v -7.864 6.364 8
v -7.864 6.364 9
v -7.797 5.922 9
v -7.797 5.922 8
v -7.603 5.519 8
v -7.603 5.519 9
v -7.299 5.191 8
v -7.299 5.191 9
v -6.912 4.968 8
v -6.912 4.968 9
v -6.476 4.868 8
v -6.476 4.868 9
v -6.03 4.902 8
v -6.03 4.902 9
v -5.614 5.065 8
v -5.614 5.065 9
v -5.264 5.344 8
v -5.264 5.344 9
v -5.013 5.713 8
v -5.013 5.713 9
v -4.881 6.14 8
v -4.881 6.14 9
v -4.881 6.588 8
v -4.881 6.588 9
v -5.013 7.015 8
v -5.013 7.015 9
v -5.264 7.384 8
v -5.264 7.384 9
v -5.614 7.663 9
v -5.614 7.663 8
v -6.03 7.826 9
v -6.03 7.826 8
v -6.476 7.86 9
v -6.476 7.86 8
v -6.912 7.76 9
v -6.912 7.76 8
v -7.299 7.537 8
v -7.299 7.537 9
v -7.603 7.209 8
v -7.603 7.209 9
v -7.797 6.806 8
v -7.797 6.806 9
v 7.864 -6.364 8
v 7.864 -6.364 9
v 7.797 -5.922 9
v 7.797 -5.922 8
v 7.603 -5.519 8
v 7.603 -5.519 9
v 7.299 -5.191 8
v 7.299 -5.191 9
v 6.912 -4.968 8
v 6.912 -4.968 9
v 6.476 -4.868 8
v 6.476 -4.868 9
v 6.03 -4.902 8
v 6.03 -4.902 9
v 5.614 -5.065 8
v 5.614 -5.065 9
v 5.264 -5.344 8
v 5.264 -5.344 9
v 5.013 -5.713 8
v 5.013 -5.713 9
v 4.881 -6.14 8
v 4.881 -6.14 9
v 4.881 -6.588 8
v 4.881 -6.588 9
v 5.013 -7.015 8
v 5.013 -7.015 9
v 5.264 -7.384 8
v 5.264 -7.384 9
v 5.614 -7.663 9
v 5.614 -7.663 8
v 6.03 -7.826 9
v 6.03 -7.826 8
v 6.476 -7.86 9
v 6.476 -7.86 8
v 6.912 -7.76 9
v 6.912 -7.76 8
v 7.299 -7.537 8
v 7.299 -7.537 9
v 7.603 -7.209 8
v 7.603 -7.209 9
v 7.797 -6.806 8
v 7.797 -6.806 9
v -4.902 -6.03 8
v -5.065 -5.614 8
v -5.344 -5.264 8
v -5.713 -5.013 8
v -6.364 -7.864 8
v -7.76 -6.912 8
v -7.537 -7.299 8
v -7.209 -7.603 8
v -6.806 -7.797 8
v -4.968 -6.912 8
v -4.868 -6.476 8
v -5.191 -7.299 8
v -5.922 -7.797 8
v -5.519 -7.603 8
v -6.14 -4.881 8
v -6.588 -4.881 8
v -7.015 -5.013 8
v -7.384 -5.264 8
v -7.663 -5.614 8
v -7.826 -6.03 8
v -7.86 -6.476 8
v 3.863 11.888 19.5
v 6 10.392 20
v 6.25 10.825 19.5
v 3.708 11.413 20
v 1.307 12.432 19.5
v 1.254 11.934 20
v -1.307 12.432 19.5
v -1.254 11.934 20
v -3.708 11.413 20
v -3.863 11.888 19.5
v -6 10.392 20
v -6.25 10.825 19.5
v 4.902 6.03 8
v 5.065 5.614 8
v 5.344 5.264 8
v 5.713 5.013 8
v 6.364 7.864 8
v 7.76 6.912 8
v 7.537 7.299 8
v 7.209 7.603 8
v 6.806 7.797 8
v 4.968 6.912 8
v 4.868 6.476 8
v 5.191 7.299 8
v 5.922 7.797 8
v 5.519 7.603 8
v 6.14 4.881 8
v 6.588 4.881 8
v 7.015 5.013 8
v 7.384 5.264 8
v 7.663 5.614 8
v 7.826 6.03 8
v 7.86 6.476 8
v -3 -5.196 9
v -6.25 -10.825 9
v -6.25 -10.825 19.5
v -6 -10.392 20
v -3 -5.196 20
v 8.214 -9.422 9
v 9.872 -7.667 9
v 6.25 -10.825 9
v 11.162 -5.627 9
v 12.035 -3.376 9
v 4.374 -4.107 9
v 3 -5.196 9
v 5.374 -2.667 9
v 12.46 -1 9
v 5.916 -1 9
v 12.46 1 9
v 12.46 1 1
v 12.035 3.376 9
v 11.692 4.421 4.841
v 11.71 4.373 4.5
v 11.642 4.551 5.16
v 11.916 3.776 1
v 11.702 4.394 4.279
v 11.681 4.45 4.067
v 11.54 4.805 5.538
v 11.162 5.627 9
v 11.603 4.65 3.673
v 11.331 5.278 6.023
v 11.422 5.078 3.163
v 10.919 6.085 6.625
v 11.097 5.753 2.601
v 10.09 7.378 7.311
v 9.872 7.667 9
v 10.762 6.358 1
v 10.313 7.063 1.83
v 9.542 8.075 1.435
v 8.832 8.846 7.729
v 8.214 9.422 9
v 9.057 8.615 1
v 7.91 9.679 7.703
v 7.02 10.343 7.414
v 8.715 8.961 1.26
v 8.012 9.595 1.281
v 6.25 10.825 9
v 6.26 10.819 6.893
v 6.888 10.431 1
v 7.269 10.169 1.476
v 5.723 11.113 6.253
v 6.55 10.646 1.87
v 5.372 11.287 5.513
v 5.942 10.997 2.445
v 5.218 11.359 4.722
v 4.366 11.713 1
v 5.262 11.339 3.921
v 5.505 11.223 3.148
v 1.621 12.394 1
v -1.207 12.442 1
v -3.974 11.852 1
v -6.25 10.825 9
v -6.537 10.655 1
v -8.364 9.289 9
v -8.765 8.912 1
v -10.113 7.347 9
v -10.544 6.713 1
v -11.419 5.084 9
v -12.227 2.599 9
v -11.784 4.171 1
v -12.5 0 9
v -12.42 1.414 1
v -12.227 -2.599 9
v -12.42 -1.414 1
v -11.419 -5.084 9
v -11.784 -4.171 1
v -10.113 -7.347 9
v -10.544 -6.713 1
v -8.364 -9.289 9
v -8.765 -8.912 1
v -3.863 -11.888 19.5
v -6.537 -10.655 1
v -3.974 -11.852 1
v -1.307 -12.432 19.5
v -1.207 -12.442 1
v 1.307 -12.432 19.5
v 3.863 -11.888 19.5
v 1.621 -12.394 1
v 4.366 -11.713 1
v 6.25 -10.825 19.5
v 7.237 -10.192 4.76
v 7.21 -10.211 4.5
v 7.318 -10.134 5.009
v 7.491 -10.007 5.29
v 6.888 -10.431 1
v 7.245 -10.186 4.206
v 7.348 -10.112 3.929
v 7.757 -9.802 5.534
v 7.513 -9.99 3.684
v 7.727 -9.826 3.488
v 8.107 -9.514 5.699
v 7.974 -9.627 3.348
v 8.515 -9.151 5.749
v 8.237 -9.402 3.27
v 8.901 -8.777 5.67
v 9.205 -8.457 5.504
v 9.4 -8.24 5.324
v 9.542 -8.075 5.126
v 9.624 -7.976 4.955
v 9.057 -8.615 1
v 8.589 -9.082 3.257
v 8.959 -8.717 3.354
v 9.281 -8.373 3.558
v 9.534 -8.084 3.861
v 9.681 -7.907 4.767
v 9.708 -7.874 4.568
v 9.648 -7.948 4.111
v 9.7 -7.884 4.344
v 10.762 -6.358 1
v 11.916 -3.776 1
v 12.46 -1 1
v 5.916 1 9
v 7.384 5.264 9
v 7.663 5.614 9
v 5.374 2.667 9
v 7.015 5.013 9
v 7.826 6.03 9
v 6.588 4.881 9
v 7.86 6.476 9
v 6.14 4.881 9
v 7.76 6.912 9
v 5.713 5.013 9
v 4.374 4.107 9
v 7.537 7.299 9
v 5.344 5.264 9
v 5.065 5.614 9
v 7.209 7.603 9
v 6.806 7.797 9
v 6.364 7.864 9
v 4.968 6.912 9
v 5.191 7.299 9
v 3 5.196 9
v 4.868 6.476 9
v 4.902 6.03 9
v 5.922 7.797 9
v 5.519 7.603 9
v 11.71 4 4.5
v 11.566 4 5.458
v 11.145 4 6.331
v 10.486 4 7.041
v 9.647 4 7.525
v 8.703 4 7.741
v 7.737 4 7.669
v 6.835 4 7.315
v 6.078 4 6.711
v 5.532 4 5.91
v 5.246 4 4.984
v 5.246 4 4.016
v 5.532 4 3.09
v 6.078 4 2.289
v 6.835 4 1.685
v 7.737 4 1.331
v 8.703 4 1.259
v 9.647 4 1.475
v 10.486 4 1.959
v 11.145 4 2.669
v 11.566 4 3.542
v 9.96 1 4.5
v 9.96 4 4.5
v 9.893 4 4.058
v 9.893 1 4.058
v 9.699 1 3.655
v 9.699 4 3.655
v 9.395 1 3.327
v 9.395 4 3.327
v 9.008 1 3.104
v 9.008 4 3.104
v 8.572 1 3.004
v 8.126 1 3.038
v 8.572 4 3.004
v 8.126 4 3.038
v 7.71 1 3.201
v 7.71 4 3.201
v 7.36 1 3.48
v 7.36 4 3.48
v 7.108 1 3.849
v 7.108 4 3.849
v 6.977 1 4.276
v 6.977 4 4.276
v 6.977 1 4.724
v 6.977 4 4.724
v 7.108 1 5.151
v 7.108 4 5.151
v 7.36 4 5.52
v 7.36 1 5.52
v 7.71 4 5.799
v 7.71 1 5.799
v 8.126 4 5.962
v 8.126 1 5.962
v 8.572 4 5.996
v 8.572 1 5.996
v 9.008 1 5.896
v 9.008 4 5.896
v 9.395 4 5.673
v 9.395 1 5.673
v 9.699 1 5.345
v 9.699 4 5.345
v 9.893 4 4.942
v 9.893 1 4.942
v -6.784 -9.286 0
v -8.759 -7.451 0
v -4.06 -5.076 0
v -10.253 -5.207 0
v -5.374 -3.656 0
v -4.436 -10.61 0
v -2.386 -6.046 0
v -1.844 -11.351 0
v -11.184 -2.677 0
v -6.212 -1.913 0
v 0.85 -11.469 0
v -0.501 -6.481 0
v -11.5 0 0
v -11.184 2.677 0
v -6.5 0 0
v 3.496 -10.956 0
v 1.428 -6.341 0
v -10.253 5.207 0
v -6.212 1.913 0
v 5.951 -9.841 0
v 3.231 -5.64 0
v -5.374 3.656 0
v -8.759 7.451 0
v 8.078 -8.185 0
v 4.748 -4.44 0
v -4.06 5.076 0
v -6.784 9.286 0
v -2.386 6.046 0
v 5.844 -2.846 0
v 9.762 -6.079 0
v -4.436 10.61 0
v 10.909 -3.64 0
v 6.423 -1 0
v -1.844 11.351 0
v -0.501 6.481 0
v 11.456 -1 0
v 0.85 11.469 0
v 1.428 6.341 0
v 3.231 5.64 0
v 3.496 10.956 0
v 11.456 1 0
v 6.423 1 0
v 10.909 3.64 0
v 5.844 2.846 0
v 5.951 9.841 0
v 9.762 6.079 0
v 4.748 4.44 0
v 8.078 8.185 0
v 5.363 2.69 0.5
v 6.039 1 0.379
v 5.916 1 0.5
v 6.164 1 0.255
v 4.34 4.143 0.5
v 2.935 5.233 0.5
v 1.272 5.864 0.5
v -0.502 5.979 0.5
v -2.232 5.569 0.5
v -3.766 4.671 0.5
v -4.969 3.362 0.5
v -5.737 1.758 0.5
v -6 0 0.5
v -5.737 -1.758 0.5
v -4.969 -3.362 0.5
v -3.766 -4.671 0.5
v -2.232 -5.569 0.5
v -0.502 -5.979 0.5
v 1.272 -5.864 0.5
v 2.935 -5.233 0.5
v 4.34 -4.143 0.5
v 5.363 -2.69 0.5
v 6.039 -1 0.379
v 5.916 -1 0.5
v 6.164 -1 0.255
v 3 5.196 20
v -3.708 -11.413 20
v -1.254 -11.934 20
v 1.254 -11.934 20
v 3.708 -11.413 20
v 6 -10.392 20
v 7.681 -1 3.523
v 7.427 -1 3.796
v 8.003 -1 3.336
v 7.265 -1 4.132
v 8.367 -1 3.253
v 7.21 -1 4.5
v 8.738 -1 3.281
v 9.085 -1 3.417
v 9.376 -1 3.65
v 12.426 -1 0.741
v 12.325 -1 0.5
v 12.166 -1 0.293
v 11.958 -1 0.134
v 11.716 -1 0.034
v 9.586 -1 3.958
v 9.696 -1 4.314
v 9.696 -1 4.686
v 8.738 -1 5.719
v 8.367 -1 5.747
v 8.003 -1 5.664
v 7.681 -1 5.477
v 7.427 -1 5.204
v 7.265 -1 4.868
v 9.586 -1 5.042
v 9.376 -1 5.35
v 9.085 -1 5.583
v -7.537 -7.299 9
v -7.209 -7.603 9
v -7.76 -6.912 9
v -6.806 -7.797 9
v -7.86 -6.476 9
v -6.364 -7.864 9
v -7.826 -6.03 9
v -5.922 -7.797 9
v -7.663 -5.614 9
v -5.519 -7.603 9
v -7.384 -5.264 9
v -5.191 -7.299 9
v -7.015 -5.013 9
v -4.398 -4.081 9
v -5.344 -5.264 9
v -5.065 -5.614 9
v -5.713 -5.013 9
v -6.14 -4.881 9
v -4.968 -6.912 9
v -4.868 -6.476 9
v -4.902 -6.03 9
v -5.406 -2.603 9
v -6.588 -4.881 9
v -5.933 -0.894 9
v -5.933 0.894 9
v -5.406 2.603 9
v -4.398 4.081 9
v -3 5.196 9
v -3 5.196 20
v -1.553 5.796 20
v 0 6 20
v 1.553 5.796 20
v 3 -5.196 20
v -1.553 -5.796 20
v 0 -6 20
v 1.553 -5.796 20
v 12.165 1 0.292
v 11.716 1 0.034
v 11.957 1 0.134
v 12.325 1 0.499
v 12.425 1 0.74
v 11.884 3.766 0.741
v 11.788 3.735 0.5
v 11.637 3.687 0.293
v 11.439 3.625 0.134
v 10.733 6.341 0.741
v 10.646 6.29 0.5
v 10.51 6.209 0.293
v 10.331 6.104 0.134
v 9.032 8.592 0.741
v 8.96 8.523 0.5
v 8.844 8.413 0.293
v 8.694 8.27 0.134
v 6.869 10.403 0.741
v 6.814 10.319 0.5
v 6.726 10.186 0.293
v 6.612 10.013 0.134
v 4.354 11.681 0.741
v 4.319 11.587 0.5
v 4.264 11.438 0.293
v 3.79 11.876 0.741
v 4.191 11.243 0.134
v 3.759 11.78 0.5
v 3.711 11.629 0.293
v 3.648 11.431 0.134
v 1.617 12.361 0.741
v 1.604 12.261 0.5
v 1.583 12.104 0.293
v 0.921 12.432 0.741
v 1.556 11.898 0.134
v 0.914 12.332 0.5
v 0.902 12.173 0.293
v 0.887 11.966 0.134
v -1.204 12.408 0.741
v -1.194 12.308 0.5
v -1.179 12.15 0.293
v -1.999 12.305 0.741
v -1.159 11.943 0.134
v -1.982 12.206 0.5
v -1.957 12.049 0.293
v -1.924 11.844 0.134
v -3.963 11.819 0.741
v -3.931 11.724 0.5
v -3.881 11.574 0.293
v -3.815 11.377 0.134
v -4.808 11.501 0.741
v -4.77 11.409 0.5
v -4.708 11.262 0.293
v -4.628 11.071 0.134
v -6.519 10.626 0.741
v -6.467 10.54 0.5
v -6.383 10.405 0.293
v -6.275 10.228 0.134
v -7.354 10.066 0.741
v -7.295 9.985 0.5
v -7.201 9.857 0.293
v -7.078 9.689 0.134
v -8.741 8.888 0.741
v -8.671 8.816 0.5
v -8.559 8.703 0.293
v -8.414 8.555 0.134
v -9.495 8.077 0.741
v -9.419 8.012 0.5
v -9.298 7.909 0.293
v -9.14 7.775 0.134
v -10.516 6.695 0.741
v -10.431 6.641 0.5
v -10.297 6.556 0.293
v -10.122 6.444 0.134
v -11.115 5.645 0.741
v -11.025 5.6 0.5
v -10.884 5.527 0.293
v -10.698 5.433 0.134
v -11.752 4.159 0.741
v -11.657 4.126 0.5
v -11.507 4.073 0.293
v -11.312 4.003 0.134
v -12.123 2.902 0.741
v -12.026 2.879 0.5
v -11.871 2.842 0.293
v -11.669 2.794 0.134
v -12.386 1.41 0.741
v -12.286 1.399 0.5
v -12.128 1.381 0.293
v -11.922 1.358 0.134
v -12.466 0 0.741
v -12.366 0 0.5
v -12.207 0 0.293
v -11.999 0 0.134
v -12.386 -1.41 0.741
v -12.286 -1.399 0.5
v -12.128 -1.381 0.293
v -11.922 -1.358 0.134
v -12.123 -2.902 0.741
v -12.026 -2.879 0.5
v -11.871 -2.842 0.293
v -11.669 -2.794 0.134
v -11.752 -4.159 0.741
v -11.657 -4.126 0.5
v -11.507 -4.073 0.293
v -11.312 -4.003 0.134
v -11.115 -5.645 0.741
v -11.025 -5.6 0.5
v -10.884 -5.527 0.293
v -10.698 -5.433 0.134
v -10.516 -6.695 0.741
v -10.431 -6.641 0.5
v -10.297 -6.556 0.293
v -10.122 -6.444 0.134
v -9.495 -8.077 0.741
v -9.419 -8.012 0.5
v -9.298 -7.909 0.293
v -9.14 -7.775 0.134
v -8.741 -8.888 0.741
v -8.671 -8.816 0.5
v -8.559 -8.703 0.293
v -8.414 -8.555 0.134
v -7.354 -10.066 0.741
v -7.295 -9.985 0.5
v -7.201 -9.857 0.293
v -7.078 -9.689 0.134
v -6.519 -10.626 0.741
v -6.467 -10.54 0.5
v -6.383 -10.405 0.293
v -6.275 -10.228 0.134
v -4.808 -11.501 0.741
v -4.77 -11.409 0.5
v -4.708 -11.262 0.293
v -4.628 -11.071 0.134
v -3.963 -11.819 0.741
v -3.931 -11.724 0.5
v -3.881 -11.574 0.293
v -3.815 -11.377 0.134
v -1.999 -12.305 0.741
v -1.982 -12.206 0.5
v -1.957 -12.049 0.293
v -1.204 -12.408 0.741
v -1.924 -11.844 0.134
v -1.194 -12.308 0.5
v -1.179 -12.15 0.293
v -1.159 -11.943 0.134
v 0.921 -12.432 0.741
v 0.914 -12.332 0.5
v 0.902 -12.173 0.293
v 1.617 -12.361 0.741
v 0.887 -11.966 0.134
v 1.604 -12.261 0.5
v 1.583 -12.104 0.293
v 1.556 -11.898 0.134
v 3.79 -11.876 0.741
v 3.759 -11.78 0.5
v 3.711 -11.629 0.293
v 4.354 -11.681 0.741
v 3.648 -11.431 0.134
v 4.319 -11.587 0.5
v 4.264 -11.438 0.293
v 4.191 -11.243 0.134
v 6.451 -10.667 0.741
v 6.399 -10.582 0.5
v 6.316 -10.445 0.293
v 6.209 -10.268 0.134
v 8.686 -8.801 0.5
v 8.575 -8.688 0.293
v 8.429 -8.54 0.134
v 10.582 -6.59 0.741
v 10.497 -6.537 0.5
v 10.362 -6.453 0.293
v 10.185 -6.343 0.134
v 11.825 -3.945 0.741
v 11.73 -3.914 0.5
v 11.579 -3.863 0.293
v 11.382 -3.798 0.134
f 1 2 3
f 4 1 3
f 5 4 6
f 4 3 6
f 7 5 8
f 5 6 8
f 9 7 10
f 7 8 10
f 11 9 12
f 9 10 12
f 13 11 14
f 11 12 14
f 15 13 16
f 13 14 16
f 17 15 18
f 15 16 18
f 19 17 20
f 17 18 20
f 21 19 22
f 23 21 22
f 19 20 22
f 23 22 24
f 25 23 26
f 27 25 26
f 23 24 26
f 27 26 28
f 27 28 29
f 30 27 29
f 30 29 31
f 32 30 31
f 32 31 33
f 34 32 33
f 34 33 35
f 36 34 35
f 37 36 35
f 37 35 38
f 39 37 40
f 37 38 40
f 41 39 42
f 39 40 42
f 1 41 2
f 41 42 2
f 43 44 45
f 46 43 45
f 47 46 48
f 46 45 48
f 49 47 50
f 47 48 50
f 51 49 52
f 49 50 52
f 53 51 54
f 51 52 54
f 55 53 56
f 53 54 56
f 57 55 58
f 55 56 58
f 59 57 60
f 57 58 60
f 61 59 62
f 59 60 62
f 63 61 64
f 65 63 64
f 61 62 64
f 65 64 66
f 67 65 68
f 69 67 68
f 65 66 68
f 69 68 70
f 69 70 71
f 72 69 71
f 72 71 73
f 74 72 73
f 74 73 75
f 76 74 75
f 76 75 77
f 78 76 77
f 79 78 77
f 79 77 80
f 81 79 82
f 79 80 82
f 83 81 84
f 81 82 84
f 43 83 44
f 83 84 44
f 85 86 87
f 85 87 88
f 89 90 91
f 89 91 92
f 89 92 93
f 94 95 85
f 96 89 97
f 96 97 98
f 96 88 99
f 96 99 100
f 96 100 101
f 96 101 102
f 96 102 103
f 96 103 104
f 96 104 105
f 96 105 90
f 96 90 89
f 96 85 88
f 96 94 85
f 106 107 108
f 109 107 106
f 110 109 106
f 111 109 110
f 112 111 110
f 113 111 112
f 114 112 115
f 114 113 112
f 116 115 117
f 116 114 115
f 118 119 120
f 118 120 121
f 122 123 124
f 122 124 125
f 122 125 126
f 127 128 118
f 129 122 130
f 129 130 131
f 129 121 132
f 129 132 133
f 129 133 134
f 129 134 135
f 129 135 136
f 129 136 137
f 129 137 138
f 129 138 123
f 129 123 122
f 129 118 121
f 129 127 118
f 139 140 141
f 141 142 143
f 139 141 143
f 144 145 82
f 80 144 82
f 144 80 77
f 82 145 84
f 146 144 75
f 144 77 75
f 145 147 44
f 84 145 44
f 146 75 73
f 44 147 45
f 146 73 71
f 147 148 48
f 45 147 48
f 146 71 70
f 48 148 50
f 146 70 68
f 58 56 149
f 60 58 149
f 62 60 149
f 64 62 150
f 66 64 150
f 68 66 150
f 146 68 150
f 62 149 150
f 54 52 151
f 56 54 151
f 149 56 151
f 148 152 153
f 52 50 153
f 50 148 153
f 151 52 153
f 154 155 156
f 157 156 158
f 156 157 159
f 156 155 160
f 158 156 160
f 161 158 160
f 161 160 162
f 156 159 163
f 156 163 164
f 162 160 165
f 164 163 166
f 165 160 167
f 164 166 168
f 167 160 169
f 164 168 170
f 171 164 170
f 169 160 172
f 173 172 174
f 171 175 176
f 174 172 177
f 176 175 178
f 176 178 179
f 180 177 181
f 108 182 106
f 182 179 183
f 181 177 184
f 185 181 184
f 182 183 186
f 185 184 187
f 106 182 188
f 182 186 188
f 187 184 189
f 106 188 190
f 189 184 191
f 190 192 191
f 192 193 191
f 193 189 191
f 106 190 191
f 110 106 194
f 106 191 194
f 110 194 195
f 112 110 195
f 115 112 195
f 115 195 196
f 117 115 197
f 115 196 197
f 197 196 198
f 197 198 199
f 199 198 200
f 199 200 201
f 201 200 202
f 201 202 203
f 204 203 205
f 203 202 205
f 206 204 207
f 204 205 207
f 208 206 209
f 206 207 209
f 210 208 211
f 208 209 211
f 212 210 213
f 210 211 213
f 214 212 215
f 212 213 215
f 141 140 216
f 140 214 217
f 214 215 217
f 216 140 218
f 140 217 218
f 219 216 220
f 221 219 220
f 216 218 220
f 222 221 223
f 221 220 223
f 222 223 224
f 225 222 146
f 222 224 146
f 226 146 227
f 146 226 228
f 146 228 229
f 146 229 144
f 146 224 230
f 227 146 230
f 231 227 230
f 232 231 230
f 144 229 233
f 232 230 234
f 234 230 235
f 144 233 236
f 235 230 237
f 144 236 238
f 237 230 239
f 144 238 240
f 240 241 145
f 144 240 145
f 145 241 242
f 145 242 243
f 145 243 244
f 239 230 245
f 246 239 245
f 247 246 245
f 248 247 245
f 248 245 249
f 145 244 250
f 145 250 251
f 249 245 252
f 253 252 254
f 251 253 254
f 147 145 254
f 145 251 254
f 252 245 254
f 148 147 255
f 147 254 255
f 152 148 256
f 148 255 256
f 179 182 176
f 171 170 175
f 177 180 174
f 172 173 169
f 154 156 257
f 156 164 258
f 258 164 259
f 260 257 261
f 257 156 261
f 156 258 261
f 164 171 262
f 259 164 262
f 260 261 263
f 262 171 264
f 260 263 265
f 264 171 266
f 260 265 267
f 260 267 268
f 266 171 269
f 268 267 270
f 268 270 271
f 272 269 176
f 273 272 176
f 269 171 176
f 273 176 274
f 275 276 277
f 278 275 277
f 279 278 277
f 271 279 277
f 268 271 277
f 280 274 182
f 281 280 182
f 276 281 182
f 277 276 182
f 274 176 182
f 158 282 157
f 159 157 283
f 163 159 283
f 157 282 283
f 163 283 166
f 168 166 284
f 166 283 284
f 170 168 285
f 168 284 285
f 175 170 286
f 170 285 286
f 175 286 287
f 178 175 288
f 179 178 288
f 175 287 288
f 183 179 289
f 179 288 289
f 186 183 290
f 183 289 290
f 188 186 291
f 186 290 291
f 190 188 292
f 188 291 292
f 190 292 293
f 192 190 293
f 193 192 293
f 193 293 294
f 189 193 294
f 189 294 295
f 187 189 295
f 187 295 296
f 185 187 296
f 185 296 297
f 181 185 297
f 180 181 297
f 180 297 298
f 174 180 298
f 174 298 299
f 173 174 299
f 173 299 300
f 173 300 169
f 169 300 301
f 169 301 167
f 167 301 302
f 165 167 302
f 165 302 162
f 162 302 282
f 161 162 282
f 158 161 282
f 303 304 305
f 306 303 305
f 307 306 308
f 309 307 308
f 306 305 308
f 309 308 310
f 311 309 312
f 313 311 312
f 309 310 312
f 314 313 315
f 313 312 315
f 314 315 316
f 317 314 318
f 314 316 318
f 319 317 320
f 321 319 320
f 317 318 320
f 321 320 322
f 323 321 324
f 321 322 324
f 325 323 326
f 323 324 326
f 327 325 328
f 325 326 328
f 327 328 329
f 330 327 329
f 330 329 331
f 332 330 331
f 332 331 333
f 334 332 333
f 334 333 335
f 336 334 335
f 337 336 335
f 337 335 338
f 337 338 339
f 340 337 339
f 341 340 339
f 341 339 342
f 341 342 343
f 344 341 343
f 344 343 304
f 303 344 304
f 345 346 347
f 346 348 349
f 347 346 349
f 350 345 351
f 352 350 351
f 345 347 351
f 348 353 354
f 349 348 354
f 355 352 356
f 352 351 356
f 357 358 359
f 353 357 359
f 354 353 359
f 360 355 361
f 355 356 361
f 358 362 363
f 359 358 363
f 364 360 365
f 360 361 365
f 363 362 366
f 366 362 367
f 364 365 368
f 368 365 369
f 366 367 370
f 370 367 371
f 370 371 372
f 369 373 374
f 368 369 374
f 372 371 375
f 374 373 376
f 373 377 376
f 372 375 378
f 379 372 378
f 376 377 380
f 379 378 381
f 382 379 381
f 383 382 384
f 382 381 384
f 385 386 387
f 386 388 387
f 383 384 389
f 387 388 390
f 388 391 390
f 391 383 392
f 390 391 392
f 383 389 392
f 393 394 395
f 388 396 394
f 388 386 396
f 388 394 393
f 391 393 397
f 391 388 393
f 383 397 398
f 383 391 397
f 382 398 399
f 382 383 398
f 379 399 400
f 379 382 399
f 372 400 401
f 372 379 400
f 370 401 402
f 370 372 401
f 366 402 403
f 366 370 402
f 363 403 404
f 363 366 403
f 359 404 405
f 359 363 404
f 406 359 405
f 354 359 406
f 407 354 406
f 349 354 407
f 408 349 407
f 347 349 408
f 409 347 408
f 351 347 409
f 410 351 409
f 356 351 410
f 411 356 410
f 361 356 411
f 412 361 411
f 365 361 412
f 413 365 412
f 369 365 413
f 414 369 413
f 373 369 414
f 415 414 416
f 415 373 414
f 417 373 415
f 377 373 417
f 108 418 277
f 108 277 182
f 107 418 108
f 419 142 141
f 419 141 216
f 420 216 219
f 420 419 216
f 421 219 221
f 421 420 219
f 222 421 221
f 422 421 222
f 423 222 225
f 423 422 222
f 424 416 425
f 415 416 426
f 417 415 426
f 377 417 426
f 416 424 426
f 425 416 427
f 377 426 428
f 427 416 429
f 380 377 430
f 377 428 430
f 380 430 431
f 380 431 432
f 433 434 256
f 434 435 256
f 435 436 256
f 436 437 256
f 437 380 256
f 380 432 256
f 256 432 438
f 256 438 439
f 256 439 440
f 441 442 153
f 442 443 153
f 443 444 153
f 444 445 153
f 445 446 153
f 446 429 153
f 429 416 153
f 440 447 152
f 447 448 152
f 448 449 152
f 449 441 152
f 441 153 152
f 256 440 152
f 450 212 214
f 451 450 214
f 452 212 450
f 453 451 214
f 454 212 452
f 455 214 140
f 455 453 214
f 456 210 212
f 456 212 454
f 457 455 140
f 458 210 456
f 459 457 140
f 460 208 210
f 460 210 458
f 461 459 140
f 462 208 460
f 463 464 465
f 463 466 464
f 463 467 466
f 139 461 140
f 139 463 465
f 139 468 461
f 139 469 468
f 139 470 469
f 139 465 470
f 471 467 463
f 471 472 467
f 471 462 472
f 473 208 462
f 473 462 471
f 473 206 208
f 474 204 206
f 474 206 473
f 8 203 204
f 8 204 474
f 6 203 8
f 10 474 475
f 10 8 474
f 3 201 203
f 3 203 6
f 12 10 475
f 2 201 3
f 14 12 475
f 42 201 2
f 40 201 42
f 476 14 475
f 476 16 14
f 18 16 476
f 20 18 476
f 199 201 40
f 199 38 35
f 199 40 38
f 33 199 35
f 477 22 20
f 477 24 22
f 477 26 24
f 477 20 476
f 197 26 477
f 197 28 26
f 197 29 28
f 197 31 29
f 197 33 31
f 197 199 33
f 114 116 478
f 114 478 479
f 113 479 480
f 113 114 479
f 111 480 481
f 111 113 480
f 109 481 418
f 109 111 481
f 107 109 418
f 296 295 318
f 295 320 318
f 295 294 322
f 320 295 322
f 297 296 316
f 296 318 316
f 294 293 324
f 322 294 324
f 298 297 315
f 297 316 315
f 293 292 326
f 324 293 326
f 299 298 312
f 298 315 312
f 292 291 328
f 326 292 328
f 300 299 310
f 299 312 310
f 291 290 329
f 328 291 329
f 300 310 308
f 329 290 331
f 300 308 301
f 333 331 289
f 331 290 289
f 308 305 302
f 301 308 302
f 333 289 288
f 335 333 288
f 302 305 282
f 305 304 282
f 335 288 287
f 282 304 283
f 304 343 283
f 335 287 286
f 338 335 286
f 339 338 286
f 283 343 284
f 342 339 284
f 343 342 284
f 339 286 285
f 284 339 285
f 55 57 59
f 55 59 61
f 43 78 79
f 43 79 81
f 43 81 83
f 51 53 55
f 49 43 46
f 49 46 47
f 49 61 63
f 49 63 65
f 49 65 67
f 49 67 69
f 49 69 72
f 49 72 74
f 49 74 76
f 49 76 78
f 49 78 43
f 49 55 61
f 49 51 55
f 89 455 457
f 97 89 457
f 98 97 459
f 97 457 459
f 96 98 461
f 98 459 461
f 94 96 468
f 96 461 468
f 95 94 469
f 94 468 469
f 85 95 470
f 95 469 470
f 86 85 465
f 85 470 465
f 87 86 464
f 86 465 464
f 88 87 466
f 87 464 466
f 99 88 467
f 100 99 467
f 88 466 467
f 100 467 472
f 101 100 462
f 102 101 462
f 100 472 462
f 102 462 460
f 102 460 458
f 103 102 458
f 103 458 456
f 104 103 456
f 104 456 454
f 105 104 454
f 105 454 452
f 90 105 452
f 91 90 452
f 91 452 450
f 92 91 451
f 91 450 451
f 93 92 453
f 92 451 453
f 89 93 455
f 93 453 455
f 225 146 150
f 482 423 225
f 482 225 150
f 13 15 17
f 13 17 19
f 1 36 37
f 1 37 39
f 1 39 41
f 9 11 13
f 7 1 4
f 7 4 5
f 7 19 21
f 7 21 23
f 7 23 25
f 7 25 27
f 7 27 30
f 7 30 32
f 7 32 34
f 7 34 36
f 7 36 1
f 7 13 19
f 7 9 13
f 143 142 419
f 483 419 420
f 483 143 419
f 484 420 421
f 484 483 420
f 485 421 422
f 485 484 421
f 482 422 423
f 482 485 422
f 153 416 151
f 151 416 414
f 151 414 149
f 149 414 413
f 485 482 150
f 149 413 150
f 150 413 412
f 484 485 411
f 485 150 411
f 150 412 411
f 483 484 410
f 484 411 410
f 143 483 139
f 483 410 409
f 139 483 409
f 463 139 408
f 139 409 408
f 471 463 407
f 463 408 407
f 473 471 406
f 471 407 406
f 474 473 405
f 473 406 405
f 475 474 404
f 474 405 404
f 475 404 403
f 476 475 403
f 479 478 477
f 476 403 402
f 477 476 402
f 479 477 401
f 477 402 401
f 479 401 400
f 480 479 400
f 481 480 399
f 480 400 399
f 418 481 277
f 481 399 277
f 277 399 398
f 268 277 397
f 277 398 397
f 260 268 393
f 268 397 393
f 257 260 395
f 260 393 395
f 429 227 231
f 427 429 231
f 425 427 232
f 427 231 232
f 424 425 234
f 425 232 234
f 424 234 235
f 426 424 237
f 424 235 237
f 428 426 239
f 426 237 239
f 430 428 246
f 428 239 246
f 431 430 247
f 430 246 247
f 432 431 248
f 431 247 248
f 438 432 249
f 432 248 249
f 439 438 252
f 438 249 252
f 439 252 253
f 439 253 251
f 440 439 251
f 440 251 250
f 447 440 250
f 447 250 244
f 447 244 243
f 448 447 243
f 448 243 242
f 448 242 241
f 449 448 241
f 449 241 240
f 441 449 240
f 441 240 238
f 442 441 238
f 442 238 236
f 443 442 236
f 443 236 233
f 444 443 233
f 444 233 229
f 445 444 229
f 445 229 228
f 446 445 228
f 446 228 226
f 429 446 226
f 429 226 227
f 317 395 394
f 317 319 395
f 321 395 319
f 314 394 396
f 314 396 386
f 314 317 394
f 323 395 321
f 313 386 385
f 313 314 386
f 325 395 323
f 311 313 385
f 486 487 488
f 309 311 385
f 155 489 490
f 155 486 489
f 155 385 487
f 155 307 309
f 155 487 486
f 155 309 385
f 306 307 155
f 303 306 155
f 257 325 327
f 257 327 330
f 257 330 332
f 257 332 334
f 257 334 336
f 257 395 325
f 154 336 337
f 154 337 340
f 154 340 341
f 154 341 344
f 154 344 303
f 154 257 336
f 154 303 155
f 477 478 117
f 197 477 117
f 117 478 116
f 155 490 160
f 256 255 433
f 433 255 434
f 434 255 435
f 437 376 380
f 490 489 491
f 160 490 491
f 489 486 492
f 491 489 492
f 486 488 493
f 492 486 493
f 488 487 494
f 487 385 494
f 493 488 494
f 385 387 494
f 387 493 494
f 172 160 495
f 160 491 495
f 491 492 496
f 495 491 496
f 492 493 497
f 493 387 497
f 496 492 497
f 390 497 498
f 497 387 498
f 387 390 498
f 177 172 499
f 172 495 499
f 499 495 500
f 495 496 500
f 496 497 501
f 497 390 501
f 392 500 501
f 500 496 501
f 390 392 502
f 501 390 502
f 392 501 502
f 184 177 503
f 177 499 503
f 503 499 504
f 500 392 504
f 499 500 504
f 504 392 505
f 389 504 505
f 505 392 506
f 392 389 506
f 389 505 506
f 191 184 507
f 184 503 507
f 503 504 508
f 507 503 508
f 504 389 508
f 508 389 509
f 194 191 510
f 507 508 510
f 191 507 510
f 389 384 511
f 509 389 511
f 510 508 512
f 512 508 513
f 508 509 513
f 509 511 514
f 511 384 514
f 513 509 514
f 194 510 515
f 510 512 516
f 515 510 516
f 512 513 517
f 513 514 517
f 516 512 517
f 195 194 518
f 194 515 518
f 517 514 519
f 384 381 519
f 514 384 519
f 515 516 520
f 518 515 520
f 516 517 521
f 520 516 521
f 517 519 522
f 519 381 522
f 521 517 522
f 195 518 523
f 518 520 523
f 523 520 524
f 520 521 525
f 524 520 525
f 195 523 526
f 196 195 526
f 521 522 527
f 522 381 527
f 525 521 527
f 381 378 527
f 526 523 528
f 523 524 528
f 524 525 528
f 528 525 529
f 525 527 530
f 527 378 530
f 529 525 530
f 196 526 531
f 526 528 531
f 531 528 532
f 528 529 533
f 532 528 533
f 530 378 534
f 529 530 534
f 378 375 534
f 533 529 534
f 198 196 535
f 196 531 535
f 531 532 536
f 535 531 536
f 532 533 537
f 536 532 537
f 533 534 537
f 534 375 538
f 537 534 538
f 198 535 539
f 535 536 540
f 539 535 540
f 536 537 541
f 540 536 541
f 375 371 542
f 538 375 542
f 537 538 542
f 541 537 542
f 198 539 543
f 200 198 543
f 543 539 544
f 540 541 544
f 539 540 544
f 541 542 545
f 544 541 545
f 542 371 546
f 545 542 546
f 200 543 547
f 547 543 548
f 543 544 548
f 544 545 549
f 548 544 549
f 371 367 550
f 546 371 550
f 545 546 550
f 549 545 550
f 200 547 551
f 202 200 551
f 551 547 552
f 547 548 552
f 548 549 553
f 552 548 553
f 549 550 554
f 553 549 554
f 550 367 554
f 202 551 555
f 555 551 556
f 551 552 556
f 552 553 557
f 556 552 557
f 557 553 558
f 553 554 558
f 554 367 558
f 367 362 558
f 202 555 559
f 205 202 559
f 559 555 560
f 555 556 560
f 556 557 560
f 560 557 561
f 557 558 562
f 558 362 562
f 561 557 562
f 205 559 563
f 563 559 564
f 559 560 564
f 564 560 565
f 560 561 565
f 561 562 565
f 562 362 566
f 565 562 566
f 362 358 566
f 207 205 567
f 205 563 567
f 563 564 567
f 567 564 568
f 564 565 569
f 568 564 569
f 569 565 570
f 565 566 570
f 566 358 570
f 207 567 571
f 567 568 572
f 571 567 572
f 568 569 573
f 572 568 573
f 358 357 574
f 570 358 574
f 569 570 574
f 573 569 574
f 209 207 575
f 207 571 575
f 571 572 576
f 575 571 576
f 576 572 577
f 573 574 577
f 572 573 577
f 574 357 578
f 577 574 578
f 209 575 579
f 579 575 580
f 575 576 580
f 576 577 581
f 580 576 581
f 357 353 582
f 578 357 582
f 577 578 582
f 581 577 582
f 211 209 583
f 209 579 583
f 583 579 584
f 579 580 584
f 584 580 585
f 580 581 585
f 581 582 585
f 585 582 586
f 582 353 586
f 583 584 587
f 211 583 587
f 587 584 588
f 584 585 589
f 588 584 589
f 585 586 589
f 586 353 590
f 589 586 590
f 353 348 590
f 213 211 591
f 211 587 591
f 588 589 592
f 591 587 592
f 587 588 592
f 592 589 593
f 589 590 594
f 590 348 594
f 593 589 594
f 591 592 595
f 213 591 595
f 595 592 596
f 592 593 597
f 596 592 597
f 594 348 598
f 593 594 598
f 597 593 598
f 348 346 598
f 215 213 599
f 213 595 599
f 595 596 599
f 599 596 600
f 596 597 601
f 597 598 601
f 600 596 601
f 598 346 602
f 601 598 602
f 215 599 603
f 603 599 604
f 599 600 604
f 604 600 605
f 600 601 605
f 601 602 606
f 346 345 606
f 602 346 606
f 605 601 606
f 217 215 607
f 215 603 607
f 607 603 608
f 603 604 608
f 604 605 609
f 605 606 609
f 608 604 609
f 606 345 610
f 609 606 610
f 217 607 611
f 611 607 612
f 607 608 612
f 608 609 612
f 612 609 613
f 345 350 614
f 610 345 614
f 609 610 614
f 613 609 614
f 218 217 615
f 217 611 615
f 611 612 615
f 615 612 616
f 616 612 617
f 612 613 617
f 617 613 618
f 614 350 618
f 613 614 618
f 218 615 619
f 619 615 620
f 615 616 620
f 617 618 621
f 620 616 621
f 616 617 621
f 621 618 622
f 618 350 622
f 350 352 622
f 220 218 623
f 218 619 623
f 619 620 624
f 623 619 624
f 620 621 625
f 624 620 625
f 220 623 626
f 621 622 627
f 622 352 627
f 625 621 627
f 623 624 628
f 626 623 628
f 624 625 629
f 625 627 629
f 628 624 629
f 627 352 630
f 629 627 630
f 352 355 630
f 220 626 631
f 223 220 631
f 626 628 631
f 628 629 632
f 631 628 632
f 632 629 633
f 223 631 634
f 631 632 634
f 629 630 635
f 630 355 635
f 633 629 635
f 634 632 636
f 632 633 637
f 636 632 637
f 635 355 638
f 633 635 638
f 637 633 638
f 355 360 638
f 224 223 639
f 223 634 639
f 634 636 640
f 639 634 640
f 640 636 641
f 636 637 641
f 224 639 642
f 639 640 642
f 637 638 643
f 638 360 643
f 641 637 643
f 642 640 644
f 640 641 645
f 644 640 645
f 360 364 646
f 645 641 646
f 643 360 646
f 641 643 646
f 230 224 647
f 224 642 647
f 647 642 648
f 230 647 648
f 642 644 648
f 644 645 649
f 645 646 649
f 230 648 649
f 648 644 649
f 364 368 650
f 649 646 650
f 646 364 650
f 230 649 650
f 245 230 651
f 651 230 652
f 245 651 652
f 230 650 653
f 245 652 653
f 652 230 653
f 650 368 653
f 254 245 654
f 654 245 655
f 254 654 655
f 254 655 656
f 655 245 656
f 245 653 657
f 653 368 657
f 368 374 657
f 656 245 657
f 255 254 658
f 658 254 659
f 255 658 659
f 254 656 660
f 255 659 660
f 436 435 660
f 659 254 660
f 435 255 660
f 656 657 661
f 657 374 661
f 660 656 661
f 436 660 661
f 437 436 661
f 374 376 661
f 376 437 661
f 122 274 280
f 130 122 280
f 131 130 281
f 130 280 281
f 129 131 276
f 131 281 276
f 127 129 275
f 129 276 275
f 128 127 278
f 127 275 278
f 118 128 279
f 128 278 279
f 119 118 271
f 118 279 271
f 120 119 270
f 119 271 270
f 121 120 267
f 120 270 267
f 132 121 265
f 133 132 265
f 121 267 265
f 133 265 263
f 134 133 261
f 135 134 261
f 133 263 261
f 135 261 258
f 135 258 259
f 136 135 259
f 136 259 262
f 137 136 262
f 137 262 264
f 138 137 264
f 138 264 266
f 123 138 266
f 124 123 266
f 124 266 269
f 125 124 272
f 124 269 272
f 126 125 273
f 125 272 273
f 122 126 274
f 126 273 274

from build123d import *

# Parameters (mm, degrees)
ESBO_O1_R                 = 12.5
RESSALTO_EXTRUS_O1_DEPTH  = 20
CORTE_EXTRUS_O3_DEPTH     = 11
ESBO_O3_R                 = 6
CORTE_EXTRUS_O4_DEPTH     = 21
ESBO_O6_W                 = 12
ESBO_O6_H                 = 2
CORTE_EXTRUS_O5_DEPTH     = 10
CORTE_EXTRUS_O6_START     = -3
ESBO_O7_R                 = 3.25
CORTE_EXTRUS_O6_DEPTH     = 9.5
FURO_ROSCADO_DE_M3X0_51_D = 2.5
FILETE1_R                 = 1
ESBO_O10_R                = 1.5
CORTE_EXTRUS_O7_DEPTH     = 1
CHANFRO1_SIZE             = 0.5
CORTE_EXTRUS_O8_REACH     = 18.5
ESBO_O11_R                = 1.5
PADR_OCIRCULAR1_COUNT     = 4
CHANFRO2_SIZE             = 0.5


with BuildPart() as part:
    # Esboço1 → Ressalto-extrusão1 (new body)
    with BuildSketch(Plane.XY):
        Circle(ESBO_O1_R)
    extrude(amount=RESSALTO_EXTRUS_O1_DEPTH)

    # Esboço2 → Corte-extrusão3 (cut)
    with BuildSketch(Plane.XY.offset(20)):
        with BuildLine():
            Line((0, 0), (6.25, 10.825317547))
            ThreePointArc((6.25, 10.825317547), (12.5, 0), (6.25, -10.825317547))
            Line((6.25, -10.825317547), (0, 0))
        make_face()
    corte_extrus_o3 = extrude(amount=-CORTE_EXTRUS_O3_DEPTH, mode=Mode.SUBTRACT)

    # Esboço3 → Corte-extrusão4 (cut, through all)
    with BuildSketch(Plane(origin=(0, 0, 0), x_dir=(-1, 0, 0), z_dir=(0, 0, -1))):
        Circle(ESBO_O3_R)
    extrude(amount=-CORTE_EXTRUS_O4_DEPTH, mode=Mode.SUBTRACT)

    # Espelhar1: Corte-extrusão3 across plane
    add(corte_extrus_o3.mirror(Plane(origin=(0, 0, 0), x_dir=(0, 0, 1), z_dir=(1, 0, 0))), mode=Mode.SUBTRACT)

    # Esboço6 → Corte-extrusão5 (cut, through all)
    with BuildSketch(Plane.XY.offset(9)):
        with Locations((7, 0)):
            Rectangle(ESBO_O6_W, ESBO_O6_H)
    extrude(amount=-CORTE_EXTRUS_O5_DEPTH, mode=Mode.SUBTRACT)

    # Esboço7 → Corte-extrusão6 (cut, through all)
    with BuildSketch(Plane.XZ.offset(-1).offset(CORTE_EXTRUS_O6_START)):
        with Locations((8.459935794, 4.5)):
            Circle(ESBO_O7_R)
    extrude(amount=-CORTE_EXTRUS_O6_DEPTH, mode=Mode.SUBTRACT)

    # Furo roscado de M3x0.51 (through all)
    with Locations(Plane(origin=(0, 4, 0), x_dir=(1, 0, 0), z_dir=(0, 1, 0))):
        with Locations((8.459935794, -4.5)):
            Hole(FURO_ROSCADO_DE_M3X0_51_D / 2)

    # Filete1
    filete1_edges = [part.edges().sort_by_distance(p)[0] for p in [
        (-12.5, 0, 0),
    ]]
    fillet(filete1_edges, radius=FILETE1_R)

    # Esboço10 → Corte-extrusão7 (cut)
    with BuildSketch(Plane.XY.offset(9)):
        with Locations((6.363961031, -6.363961031)):
            Circle(ESBO_O10_R)
    corte_extrus_o7 = extrude(amount=-CORTE_EXTRUS_O7_DEPTH, mode=Mode.SUBTRACT)

    # Chanfro1
    chanfro1_edges = [part.edges().sort_by_distance(p)[0] for p in [
        (0, -12.5, 20),
        (0, 12.5, 20),
    ]]
    chamfer(chanfro1_edges, length=CHANFRO1_SIZE)

    # Esboço11 → Corte-extrusão8 (cut, up to next)
    with BuildSketch(Plane(origin=(0, 4, 0), x_dir=(1, 0, 0), z_dir=(0, 1, 0)), mode=Mode.PRIVATE) as corte_extrus_o8_sk1:
        with Locations((8.459935794, -4.5)):
            Circle(ESBO_O11_R)
    corte_extrus_o8_tool1 = extrude(corte_extrus_o8_sk1.sketch, amount=-CORTE_EXTRUS_O8_REACH, mode=Mode.PRIVATE) & part.part
    add(corte_extrus_o8_tool1.solids().sort_by_distance((8.459936, 4, 4.5))[0], mode=Mode.SUBTRACT)

    # PadrãoCircular1: Corte-extrusão7 ×4 about axis
    padr_ocircular1_axis = Axis((0, 0, 0), (0, 0, 1))
    for i in range(1, PADR_OCIRCULAR1_COUNT):
        add(corte_extrus_o7.rotate(padr_ocircular1_axis, i * 360 / PADR_OCIRCULAR1_COUNT), mode=Mode.SUBTRACT)

    # Chanfro2
    chanfro2_edges = [part.edges().sort_by_distance(p)[0] for p in [
        (-6, 0, 0),
    ]]
    chamfer(chanfro2_edges, length=CHANFRO2_SIZE)


solid = part.part
